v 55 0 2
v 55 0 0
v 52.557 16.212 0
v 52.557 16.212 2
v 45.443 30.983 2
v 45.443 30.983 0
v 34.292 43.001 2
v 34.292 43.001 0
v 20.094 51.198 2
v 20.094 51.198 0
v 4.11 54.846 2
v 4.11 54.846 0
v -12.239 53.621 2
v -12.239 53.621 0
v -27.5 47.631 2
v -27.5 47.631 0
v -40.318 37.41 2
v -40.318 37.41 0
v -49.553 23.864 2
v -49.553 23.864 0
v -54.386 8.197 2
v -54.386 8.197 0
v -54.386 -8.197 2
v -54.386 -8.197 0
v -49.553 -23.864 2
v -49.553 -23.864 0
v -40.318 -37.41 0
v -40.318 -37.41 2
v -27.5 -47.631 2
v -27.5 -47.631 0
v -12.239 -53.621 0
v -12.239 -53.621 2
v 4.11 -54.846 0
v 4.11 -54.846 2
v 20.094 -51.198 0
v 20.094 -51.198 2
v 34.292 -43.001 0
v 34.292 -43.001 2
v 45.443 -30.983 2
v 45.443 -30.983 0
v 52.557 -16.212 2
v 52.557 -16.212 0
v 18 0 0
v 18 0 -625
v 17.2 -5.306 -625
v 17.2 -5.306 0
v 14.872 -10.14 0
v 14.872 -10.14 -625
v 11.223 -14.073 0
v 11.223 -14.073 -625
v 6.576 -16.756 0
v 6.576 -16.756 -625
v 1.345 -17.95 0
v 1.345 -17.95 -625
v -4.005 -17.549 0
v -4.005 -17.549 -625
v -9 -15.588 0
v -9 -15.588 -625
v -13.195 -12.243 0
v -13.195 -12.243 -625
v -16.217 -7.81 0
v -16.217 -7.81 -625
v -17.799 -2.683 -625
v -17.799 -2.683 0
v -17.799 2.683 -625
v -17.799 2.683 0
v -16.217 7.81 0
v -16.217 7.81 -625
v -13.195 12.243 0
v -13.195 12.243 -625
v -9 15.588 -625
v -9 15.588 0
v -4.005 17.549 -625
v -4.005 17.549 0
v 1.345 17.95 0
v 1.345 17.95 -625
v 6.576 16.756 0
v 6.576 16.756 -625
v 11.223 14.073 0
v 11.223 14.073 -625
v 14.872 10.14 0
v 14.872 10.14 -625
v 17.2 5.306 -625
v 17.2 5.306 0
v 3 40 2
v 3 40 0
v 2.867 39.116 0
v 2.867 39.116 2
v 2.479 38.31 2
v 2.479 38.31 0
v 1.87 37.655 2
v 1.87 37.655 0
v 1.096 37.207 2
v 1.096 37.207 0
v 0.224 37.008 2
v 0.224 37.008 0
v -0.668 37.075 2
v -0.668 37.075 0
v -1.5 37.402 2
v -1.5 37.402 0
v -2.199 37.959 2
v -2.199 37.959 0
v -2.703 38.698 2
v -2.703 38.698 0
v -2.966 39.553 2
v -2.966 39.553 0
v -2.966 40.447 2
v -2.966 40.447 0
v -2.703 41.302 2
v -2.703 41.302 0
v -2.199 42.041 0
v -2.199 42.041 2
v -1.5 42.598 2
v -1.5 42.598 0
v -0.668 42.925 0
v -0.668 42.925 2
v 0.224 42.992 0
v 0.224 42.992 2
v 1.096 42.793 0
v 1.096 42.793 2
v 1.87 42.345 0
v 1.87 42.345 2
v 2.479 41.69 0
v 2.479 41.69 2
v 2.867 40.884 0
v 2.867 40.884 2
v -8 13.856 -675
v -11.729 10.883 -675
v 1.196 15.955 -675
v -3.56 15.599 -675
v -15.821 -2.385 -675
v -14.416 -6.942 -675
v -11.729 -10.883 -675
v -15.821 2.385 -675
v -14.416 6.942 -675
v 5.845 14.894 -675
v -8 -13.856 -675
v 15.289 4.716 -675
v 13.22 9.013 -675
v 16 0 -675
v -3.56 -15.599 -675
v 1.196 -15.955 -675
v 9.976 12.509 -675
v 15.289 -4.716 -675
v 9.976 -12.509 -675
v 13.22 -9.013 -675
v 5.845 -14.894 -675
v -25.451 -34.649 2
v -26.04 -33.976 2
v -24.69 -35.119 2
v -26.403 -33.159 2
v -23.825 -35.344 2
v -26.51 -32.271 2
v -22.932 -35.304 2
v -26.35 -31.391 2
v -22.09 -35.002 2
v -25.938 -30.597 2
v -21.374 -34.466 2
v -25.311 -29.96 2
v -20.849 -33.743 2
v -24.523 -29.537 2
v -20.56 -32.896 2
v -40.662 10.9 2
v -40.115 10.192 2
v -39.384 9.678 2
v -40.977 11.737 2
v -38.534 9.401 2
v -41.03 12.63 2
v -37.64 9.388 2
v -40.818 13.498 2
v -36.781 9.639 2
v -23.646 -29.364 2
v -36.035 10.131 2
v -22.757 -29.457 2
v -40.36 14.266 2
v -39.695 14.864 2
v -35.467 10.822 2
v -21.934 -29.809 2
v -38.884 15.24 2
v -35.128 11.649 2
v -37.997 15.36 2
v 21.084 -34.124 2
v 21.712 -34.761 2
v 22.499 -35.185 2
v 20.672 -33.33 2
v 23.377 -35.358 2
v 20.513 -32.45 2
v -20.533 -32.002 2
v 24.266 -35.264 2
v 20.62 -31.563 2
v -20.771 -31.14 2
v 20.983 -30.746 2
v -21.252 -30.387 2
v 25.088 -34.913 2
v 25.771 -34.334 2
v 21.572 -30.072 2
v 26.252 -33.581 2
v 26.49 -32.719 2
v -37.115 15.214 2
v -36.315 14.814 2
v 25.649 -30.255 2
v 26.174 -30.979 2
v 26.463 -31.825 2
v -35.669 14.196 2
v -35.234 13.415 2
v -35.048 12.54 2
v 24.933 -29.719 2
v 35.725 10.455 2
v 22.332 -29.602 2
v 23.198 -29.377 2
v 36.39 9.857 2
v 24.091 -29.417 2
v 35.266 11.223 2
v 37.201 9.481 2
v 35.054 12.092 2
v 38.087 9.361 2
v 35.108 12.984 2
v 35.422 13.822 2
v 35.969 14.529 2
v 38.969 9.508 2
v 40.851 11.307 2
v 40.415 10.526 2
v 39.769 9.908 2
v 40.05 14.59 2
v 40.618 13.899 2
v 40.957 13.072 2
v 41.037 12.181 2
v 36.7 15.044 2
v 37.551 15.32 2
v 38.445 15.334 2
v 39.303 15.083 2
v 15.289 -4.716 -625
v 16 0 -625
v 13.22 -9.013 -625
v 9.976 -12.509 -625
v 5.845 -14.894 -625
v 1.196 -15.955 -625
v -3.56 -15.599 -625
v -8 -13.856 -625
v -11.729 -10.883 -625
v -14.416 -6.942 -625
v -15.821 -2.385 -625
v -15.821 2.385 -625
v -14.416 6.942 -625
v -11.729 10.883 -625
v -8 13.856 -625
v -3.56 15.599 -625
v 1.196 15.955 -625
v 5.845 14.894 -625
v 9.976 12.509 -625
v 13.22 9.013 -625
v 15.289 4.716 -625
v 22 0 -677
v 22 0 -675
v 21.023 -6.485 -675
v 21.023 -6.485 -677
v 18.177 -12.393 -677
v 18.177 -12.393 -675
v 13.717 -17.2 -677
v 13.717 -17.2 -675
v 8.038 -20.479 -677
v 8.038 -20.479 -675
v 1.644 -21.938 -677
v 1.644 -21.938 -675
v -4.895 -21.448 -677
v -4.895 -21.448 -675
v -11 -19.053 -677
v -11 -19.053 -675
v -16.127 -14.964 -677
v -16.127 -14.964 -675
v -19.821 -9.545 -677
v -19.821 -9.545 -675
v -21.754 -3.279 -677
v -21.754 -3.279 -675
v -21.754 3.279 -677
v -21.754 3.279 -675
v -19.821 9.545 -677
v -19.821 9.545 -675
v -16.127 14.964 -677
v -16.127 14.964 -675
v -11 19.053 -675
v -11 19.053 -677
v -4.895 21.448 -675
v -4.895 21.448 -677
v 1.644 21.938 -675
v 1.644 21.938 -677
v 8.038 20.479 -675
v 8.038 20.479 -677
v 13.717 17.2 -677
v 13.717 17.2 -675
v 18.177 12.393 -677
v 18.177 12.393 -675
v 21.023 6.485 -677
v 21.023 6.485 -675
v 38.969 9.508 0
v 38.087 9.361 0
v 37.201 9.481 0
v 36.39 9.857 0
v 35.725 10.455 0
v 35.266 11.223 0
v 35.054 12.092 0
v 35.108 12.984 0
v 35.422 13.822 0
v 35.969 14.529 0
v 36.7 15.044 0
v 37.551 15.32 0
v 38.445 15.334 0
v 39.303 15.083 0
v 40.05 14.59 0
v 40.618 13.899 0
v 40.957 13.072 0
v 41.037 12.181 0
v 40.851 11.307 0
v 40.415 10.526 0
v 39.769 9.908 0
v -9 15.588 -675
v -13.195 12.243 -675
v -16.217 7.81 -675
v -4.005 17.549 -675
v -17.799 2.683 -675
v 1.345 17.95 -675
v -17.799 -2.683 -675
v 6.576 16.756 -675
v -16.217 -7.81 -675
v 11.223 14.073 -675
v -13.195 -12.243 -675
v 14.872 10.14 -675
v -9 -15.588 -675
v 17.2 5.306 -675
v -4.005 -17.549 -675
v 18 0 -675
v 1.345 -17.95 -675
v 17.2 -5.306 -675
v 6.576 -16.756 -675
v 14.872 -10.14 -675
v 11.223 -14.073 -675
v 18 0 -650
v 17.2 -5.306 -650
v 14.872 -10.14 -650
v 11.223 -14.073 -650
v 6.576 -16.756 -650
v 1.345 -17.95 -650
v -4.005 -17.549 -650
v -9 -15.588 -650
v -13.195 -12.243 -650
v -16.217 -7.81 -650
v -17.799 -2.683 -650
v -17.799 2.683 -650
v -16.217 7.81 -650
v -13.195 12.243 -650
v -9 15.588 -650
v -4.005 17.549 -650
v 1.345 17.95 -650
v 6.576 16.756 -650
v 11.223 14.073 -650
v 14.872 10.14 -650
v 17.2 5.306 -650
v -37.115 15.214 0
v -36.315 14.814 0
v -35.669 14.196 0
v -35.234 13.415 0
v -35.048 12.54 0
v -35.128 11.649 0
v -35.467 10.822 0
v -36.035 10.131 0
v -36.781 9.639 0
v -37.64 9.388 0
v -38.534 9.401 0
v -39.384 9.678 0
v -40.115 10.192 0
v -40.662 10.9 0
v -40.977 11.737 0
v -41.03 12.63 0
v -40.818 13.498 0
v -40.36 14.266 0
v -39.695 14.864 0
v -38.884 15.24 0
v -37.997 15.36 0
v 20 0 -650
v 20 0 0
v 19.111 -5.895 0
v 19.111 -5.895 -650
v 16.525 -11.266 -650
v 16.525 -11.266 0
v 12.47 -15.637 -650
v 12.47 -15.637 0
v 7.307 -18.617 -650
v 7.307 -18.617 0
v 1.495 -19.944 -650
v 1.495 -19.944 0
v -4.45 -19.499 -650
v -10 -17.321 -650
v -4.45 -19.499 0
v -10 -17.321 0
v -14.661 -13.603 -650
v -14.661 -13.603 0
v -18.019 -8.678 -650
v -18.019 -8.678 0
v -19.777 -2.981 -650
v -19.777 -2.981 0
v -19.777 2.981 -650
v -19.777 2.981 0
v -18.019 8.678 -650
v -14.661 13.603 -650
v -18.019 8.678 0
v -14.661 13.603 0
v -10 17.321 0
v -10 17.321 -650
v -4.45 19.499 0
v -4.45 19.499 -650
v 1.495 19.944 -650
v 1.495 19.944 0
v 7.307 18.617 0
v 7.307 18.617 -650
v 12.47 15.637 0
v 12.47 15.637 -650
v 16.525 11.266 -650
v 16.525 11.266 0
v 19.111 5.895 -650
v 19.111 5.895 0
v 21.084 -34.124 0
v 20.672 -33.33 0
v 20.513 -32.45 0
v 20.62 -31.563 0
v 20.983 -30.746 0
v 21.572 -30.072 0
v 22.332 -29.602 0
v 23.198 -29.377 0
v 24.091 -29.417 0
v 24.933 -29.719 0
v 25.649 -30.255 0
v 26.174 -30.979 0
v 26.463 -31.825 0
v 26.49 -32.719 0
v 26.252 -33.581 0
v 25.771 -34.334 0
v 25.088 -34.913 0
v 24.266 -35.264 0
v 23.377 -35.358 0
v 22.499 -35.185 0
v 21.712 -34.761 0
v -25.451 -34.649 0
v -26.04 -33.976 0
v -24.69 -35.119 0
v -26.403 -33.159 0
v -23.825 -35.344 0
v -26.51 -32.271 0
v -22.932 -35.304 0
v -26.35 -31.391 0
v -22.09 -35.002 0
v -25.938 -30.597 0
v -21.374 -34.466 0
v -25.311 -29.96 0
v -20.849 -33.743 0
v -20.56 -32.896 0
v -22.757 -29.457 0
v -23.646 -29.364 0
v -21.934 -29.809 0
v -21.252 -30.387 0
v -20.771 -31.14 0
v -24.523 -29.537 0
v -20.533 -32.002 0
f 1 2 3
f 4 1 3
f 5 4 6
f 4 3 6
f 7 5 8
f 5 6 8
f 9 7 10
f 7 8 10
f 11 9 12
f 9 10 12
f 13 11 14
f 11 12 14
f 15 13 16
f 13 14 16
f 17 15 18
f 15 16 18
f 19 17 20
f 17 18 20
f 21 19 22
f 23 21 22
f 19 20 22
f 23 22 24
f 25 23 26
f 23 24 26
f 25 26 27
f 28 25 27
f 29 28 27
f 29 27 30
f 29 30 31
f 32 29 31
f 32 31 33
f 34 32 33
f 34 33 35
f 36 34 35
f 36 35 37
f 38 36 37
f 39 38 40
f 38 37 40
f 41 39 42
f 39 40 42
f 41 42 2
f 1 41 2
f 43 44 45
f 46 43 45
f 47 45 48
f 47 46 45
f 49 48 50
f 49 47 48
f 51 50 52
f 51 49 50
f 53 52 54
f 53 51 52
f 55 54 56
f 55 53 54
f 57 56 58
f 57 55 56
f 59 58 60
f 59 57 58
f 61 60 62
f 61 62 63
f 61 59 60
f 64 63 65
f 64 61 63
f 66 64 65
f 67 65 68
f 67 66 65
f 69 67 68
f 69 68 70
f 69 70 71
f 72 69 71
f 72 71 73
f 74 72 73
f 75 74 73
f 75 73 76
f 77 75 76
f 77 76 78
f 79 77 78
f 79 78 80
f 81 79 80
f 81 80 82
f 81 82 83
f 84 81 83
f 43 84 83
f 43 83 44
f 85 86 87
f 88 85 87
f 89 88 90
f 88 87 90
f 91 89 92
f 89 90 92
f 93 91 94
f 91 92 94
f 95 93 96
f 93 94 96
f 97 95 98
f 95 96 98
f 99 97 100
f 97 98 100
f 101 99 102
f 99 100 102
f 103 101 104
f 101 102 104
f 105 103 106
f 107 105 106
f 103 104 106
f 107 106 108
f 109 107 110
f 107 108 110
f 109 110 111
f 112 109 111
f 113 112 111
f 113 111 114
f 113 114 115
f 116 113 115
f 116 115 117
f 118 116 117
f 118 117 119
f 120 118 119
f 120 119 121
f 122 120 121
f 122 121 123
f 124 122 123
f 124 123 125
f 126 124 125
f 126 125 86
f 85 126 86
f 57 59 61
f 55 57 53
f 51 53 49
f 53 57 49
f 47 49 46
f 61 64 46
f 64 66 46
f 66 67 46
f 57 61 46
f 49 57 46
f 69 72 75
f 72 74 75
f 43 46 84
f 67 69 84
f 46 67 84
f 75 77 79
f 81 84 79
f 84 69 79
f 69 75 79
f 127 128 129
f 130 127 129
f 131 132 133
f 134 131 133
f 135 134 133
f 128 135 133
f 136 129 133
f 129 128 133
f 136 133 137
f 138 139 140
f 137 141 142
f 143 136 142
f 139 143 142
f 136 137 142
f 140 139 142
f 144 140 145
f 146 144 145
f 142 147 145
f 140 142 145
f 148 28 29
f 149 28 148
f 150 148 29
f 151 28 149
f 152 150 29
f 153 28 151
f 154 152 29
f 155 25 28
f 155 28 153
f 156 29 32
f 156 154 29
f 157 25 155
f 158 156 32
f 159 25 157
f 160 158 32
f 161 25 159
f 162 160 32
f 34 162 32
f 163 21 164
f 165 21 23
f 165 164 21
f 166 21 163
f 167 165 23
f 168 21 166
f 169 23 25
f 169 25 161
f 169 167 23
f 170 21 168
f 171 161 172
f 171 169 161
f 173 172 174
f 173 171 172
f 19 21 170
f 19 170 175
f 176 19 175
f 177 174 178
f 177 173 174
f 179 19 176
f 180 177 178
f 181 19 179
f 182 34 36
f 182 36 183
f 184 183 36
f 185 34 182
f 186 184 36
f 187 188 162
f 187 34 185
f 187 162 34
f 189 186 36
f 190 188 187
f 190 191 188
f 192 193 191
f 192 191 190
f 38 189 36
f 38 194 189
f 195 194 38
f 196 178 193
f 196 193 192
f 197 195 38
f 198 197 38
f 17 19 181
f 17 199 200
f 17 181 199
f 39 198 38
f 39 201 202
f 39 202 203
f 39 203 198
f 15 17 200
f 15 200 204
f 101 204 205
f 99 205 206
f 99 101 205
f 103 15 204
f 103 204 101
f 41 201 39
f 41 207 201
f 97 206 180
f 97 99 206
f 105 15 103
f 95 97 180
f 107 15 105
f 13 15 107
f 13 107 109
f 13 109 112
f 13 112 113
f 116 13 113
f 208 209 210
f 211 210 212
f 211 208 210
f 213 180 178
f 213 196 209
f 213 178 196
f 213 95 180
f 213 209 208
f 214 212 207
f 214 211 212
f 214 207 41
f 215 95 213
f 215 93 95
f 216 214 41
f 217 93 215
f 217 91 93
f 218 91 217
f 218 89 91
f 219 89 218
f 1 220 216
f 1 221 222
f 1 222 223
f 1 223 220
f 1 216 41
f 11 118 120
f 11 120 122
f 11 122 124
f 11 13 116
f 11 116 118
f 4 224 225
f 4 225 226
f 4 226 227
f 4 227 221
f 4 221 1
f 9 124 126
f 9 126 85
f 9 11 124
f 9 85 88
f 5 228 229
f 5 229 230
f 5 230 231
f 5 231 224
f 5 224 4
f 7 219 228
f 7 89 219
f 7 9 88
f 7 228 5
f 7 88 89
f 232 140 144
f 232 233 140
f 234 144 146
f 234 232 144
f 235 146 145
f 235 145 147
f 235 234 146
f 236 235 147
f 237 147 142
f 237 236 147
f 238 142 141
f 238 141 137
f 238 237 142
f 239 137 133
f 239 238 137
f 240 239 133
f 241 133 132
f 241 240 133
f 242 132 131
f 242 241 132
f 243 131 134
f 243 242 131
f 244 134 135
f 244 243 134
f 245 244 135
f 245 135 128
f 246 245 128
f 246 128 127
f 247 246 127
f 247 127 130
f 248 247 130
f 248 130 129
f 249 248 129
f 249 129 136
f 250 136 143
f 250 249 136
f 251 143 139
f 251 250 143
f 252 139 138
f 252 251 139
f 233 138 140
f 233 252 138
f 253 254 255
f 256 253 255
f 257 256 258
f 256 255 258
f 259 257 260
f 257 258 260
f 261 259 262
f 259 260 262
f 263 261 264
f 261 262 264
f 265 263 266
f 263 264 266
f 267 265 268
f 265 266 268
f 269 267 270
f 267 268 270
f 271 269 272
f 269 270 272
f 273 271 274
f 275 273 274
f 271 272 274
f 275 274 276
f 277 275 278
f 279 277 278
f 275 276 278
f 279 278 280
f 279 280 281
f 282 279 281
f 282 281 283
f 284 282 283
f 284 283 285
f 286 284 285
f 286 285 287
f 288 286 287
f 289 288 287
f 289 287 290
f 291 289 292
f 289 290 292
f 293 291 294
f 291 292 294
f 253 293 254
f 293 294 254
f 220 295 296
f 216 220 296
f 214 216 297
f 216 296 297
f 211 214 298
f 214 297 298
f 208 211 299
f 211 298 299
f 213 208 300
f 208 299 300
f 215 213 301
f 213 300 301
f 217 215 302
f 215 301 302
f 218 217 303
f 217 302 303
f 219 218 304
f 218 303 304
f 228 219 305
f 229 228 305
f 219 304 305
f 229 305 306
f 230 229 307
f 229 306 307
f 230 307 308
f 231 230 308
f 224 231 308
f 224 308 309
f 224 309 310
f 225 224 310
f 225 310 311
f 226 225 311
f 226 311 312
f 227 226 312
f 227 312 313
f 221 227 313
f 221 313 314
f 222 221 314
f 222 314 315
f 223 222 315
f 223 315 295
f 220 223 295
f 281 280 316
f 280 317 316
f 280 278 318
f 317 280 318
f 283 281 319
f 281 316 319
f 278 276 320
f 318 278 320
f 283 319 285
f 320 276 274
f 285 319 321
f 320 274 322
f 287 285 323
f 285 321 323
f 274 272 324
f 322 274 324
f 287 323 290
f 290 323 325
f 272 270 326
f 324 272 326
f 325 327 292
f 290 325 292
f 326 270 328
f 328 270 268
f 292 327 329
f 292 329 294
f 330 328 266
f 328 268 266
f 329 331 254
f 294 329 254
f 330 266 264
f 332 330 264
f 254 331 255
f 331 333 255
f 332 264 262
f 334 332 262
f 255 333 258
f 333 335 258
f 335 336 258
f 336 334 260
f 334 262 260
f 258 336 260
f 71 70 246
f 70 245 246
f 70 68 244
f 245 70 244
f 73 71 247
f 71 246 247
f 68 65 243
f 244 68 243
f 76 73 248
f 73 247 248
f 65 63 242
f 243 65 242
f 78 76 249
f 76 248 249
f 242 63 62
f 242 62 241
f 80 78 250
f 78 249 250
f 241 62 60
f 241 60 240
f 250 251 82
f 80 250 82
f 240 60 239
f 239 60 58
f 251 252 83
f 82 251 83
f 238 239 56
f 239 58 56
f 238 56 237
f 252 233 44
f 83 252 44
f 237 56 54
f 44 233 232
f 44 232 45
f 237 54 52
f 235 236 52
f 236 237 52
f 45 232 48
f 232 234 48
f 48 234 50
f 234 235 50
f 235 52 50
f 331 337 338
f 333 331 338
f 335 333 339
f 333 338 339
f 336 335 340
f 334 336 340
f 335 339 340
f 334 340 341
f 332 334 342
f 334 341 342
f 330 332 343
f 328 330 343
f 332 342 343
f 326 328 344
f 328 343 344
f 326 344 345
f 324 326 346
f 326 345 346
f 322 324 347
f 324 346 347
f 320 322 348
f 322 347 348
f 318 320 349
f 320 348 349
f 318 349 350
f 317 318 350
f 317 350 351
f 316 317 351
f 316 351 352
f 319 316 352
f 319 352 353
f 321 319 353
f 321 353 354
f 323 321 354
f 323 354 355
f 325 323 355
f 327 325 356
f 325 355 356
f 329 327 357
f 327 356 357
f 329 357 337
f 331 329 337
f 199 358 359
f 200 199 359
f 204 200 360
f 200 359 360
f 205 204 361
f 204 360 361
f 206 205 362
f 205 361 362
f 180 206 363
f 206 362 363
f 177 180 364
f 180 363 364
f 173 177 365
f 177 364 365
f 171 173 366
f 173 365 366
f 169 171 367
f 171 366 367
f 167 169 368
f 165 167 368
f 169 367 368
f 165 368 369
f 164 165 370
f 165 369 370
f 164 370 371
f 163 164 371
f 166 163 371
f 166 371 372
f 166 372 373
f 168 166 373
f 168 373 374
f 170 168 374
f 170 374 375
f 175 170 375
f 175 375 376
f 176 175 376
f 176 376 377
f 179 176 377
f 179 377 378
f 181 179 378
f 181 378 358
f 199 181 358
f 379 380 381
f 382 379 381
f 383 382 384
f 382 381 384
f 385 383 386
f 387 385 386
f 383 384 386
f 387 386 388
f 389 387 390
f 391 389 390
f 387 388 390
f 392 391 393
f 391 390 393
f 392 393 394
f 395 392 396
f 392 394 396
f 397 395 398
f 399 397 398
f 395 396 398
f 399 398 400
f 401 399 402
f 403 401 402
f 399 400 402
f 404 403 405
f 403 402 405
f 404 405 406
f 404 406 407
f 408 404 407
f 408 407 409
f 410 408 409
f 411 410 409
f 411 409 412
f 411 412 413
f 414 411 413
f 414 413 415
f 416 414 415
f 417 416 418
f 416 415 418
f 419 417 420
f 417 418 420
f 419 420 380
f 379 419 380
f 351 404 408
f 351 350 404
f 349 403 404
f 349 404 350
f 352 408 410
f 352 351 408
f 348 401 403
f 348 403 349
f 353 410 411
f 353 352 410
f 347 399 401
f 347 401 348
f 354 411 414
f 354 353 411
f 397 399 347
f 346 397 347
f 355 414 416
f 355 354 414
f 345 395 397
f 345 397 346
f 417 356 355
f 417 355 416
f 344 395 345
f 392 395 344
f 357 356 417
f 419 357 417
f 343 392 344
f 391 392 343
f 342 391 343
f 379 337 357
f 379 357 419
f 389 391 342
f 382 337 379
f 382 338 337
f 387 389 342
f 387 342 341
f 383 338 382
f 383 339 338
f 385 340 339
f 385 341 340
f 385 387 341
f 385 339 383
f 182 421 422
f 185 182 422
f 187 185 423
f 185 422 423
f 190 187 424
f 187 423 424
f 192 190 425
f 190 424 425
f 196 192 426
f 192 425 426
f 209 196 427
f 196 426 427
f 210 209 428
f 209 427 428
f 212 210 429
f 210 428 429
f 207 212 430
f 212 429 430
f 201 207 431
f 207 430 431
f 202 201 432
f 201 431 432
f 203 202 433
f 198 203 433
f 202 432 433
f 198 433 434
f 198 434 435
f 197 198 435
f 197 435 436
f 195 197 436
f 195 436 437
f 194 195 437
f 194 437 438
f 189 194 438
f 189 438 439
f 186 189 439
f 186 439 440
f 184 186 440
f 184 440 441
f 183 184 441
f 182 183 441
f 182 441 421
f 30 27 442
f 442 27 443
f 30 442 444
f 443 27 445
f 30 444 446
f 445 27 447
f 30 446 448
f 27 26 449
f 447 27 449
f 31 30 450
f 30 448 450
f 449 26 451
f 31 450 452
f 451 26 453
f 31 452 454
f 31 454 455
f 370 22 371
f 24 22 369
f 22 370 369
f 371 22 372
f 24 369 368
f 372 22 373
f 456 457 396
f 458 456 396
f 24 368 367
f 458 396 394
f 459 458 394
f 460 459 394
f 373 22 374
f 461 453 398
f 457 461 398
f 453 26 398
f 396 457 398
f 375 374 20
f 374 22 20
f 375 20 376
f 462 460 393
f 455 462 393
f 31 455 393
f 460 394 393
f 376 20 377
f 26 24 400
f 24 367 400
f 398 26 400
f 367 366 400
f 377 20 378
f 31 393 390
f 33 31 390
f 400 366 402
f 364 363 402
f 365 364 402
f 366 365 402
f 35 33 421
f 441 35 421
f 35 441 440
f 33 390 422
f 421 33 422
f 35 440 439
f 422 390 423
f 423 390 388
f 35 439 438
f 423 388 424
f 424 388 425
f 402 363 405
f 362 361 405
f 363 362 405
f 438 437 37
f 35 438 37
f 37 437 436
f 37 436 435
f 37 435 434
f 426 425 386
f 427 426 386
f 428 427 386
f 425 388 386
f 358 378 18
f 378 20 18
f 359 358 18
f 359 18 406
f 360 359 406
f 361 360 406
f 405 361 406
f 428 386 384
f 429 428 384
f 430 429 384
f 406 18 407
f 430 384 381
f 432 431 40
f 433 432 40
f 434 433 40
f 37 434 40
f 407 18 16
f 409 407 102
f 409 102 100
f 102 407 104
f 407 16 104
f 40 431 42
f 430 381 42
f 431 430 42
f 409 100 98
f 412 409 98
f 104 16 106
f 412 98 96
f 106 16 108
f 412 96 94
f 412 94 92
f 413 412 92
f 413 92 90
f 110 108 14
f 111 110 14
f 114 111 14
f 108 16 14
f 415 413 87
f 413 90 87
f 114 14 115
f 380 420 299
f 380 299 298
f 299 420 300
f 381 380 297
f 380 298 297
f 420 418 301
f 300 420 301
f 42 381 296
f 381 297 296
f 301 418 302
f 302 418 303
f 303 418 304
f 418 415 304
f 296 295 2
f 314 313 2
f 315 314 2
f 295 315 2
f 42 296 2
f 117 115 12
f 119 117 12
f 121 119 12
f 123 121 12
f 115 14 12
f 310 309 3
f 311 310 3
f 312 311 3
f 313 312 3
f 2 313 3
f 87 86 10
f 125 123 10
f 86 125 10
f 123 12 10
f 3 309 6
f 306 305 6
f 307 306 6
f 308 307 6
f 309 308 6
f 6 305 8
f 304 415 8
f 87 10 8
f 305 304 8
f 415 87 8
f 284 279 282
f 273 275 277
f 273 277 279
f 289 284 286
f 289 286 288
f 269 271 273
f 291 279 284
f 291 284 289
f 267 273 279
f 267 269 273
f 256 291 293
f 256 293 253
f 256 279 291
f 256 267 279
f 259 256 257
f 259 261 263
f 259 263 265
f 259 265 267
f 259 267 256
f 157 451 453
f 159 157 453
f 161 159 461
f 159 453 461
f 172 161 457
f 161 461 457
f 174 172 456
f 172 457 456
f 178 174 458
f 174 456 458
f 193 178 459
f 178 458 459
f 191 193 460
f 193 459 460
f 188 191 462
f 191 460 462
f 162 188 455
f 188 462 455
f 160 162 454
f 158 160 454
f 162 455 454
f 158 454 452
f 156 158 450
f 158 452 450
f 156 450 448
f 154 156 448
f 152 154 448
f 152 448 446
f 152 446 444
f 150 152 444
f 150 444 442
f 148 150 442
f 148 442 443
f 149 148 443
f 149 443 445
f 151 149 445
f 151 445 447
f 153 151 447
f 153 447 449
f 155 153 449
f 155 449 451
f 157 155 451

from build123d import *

# Parameters (mm, degrees)
F0_R            = 55
F1_DEPTH        = 2
F2_R            = 20
F2_R_2          = 18
F3_DEPTH        = 650
F4_R            = 18
F4_R_2          = 16
F5_DEPTH        = 25
F5_DEPTH_BACK   = 25
F6_R            = 22
F7_DEPTH        = 2
F8_R            = 3
F9_DEPTH        = 2.001
F9_COPIES_COUNT = 5


# Not quite as in the source:
# - a pattern or mirror of a feature is missing from the dataset's text; its kind, count and spacing are read off the source's solid


with BuildPart() as f1:
    # F0 (on Top) → F1 (new body)
    with BuildSketch(Plane.XY):
        Circle(F0_R)
    extrude(amount=F1_DEPTH)

    # F2 (on face) → F3 (join)
    with BuildSketch(Plane(origin=(0, 0, 0), x_dir=(1, 0, 0), z_dir=(0, 0, -1))):
        Circle(F2_R)
        Circle(F2_R_2, mode=Mode.SUBTRACT)
    extrude(amount=F3_DEPTH)

    # F4 (on face) → F5 (join, two sides)
    with BuildSketch(Plane(origin=(0, 0, -650), x_dir=(1, 0, 0), z_dir=(0, 0, -1))) as f5_sk:
        Circle(F4_R)
        Circle(F4_R_2, mode=Mode.SUBTRACT)
    extrude(amount=F5_DEPTH)
    extrude(f5_sk.sketch, amount=-F5_DEPTH_BACK)

    # F6 (on face) → F7 (join)
    with BuildSketch(Plane(origin=(0, 0, -675), x_dir=(1, 0, 0), z_dir=(0, 0, -1))):
        Circle(F6_R)
    extrude(amount=F7_DEPTH)

    # F8 (on face) → F9 (cut, through all)
    with BuildSketch(Plane(origin=(0, 0, 0), x_dir=(1, 0, 0), z_dir=(0, 0, -1))):
        with Locations((0, -40)):
            Circle(F8_R)
    f9 = extrude(amount=-F9_DEPTH, mode=Mode.SUBTRACT)

    # F9_copies: F9 ×5 about axis
    f9_copies_axis = Axis((0, 0, 0), (0, 0, 1))
    for i in range(1, F9_COPIES_COUNT):
        add(f9.rotate(f9_copies_axis, i * 360 / F9_COPIES_COUNT), mode=Mode.SUBTRACT)


solid = f1.part
